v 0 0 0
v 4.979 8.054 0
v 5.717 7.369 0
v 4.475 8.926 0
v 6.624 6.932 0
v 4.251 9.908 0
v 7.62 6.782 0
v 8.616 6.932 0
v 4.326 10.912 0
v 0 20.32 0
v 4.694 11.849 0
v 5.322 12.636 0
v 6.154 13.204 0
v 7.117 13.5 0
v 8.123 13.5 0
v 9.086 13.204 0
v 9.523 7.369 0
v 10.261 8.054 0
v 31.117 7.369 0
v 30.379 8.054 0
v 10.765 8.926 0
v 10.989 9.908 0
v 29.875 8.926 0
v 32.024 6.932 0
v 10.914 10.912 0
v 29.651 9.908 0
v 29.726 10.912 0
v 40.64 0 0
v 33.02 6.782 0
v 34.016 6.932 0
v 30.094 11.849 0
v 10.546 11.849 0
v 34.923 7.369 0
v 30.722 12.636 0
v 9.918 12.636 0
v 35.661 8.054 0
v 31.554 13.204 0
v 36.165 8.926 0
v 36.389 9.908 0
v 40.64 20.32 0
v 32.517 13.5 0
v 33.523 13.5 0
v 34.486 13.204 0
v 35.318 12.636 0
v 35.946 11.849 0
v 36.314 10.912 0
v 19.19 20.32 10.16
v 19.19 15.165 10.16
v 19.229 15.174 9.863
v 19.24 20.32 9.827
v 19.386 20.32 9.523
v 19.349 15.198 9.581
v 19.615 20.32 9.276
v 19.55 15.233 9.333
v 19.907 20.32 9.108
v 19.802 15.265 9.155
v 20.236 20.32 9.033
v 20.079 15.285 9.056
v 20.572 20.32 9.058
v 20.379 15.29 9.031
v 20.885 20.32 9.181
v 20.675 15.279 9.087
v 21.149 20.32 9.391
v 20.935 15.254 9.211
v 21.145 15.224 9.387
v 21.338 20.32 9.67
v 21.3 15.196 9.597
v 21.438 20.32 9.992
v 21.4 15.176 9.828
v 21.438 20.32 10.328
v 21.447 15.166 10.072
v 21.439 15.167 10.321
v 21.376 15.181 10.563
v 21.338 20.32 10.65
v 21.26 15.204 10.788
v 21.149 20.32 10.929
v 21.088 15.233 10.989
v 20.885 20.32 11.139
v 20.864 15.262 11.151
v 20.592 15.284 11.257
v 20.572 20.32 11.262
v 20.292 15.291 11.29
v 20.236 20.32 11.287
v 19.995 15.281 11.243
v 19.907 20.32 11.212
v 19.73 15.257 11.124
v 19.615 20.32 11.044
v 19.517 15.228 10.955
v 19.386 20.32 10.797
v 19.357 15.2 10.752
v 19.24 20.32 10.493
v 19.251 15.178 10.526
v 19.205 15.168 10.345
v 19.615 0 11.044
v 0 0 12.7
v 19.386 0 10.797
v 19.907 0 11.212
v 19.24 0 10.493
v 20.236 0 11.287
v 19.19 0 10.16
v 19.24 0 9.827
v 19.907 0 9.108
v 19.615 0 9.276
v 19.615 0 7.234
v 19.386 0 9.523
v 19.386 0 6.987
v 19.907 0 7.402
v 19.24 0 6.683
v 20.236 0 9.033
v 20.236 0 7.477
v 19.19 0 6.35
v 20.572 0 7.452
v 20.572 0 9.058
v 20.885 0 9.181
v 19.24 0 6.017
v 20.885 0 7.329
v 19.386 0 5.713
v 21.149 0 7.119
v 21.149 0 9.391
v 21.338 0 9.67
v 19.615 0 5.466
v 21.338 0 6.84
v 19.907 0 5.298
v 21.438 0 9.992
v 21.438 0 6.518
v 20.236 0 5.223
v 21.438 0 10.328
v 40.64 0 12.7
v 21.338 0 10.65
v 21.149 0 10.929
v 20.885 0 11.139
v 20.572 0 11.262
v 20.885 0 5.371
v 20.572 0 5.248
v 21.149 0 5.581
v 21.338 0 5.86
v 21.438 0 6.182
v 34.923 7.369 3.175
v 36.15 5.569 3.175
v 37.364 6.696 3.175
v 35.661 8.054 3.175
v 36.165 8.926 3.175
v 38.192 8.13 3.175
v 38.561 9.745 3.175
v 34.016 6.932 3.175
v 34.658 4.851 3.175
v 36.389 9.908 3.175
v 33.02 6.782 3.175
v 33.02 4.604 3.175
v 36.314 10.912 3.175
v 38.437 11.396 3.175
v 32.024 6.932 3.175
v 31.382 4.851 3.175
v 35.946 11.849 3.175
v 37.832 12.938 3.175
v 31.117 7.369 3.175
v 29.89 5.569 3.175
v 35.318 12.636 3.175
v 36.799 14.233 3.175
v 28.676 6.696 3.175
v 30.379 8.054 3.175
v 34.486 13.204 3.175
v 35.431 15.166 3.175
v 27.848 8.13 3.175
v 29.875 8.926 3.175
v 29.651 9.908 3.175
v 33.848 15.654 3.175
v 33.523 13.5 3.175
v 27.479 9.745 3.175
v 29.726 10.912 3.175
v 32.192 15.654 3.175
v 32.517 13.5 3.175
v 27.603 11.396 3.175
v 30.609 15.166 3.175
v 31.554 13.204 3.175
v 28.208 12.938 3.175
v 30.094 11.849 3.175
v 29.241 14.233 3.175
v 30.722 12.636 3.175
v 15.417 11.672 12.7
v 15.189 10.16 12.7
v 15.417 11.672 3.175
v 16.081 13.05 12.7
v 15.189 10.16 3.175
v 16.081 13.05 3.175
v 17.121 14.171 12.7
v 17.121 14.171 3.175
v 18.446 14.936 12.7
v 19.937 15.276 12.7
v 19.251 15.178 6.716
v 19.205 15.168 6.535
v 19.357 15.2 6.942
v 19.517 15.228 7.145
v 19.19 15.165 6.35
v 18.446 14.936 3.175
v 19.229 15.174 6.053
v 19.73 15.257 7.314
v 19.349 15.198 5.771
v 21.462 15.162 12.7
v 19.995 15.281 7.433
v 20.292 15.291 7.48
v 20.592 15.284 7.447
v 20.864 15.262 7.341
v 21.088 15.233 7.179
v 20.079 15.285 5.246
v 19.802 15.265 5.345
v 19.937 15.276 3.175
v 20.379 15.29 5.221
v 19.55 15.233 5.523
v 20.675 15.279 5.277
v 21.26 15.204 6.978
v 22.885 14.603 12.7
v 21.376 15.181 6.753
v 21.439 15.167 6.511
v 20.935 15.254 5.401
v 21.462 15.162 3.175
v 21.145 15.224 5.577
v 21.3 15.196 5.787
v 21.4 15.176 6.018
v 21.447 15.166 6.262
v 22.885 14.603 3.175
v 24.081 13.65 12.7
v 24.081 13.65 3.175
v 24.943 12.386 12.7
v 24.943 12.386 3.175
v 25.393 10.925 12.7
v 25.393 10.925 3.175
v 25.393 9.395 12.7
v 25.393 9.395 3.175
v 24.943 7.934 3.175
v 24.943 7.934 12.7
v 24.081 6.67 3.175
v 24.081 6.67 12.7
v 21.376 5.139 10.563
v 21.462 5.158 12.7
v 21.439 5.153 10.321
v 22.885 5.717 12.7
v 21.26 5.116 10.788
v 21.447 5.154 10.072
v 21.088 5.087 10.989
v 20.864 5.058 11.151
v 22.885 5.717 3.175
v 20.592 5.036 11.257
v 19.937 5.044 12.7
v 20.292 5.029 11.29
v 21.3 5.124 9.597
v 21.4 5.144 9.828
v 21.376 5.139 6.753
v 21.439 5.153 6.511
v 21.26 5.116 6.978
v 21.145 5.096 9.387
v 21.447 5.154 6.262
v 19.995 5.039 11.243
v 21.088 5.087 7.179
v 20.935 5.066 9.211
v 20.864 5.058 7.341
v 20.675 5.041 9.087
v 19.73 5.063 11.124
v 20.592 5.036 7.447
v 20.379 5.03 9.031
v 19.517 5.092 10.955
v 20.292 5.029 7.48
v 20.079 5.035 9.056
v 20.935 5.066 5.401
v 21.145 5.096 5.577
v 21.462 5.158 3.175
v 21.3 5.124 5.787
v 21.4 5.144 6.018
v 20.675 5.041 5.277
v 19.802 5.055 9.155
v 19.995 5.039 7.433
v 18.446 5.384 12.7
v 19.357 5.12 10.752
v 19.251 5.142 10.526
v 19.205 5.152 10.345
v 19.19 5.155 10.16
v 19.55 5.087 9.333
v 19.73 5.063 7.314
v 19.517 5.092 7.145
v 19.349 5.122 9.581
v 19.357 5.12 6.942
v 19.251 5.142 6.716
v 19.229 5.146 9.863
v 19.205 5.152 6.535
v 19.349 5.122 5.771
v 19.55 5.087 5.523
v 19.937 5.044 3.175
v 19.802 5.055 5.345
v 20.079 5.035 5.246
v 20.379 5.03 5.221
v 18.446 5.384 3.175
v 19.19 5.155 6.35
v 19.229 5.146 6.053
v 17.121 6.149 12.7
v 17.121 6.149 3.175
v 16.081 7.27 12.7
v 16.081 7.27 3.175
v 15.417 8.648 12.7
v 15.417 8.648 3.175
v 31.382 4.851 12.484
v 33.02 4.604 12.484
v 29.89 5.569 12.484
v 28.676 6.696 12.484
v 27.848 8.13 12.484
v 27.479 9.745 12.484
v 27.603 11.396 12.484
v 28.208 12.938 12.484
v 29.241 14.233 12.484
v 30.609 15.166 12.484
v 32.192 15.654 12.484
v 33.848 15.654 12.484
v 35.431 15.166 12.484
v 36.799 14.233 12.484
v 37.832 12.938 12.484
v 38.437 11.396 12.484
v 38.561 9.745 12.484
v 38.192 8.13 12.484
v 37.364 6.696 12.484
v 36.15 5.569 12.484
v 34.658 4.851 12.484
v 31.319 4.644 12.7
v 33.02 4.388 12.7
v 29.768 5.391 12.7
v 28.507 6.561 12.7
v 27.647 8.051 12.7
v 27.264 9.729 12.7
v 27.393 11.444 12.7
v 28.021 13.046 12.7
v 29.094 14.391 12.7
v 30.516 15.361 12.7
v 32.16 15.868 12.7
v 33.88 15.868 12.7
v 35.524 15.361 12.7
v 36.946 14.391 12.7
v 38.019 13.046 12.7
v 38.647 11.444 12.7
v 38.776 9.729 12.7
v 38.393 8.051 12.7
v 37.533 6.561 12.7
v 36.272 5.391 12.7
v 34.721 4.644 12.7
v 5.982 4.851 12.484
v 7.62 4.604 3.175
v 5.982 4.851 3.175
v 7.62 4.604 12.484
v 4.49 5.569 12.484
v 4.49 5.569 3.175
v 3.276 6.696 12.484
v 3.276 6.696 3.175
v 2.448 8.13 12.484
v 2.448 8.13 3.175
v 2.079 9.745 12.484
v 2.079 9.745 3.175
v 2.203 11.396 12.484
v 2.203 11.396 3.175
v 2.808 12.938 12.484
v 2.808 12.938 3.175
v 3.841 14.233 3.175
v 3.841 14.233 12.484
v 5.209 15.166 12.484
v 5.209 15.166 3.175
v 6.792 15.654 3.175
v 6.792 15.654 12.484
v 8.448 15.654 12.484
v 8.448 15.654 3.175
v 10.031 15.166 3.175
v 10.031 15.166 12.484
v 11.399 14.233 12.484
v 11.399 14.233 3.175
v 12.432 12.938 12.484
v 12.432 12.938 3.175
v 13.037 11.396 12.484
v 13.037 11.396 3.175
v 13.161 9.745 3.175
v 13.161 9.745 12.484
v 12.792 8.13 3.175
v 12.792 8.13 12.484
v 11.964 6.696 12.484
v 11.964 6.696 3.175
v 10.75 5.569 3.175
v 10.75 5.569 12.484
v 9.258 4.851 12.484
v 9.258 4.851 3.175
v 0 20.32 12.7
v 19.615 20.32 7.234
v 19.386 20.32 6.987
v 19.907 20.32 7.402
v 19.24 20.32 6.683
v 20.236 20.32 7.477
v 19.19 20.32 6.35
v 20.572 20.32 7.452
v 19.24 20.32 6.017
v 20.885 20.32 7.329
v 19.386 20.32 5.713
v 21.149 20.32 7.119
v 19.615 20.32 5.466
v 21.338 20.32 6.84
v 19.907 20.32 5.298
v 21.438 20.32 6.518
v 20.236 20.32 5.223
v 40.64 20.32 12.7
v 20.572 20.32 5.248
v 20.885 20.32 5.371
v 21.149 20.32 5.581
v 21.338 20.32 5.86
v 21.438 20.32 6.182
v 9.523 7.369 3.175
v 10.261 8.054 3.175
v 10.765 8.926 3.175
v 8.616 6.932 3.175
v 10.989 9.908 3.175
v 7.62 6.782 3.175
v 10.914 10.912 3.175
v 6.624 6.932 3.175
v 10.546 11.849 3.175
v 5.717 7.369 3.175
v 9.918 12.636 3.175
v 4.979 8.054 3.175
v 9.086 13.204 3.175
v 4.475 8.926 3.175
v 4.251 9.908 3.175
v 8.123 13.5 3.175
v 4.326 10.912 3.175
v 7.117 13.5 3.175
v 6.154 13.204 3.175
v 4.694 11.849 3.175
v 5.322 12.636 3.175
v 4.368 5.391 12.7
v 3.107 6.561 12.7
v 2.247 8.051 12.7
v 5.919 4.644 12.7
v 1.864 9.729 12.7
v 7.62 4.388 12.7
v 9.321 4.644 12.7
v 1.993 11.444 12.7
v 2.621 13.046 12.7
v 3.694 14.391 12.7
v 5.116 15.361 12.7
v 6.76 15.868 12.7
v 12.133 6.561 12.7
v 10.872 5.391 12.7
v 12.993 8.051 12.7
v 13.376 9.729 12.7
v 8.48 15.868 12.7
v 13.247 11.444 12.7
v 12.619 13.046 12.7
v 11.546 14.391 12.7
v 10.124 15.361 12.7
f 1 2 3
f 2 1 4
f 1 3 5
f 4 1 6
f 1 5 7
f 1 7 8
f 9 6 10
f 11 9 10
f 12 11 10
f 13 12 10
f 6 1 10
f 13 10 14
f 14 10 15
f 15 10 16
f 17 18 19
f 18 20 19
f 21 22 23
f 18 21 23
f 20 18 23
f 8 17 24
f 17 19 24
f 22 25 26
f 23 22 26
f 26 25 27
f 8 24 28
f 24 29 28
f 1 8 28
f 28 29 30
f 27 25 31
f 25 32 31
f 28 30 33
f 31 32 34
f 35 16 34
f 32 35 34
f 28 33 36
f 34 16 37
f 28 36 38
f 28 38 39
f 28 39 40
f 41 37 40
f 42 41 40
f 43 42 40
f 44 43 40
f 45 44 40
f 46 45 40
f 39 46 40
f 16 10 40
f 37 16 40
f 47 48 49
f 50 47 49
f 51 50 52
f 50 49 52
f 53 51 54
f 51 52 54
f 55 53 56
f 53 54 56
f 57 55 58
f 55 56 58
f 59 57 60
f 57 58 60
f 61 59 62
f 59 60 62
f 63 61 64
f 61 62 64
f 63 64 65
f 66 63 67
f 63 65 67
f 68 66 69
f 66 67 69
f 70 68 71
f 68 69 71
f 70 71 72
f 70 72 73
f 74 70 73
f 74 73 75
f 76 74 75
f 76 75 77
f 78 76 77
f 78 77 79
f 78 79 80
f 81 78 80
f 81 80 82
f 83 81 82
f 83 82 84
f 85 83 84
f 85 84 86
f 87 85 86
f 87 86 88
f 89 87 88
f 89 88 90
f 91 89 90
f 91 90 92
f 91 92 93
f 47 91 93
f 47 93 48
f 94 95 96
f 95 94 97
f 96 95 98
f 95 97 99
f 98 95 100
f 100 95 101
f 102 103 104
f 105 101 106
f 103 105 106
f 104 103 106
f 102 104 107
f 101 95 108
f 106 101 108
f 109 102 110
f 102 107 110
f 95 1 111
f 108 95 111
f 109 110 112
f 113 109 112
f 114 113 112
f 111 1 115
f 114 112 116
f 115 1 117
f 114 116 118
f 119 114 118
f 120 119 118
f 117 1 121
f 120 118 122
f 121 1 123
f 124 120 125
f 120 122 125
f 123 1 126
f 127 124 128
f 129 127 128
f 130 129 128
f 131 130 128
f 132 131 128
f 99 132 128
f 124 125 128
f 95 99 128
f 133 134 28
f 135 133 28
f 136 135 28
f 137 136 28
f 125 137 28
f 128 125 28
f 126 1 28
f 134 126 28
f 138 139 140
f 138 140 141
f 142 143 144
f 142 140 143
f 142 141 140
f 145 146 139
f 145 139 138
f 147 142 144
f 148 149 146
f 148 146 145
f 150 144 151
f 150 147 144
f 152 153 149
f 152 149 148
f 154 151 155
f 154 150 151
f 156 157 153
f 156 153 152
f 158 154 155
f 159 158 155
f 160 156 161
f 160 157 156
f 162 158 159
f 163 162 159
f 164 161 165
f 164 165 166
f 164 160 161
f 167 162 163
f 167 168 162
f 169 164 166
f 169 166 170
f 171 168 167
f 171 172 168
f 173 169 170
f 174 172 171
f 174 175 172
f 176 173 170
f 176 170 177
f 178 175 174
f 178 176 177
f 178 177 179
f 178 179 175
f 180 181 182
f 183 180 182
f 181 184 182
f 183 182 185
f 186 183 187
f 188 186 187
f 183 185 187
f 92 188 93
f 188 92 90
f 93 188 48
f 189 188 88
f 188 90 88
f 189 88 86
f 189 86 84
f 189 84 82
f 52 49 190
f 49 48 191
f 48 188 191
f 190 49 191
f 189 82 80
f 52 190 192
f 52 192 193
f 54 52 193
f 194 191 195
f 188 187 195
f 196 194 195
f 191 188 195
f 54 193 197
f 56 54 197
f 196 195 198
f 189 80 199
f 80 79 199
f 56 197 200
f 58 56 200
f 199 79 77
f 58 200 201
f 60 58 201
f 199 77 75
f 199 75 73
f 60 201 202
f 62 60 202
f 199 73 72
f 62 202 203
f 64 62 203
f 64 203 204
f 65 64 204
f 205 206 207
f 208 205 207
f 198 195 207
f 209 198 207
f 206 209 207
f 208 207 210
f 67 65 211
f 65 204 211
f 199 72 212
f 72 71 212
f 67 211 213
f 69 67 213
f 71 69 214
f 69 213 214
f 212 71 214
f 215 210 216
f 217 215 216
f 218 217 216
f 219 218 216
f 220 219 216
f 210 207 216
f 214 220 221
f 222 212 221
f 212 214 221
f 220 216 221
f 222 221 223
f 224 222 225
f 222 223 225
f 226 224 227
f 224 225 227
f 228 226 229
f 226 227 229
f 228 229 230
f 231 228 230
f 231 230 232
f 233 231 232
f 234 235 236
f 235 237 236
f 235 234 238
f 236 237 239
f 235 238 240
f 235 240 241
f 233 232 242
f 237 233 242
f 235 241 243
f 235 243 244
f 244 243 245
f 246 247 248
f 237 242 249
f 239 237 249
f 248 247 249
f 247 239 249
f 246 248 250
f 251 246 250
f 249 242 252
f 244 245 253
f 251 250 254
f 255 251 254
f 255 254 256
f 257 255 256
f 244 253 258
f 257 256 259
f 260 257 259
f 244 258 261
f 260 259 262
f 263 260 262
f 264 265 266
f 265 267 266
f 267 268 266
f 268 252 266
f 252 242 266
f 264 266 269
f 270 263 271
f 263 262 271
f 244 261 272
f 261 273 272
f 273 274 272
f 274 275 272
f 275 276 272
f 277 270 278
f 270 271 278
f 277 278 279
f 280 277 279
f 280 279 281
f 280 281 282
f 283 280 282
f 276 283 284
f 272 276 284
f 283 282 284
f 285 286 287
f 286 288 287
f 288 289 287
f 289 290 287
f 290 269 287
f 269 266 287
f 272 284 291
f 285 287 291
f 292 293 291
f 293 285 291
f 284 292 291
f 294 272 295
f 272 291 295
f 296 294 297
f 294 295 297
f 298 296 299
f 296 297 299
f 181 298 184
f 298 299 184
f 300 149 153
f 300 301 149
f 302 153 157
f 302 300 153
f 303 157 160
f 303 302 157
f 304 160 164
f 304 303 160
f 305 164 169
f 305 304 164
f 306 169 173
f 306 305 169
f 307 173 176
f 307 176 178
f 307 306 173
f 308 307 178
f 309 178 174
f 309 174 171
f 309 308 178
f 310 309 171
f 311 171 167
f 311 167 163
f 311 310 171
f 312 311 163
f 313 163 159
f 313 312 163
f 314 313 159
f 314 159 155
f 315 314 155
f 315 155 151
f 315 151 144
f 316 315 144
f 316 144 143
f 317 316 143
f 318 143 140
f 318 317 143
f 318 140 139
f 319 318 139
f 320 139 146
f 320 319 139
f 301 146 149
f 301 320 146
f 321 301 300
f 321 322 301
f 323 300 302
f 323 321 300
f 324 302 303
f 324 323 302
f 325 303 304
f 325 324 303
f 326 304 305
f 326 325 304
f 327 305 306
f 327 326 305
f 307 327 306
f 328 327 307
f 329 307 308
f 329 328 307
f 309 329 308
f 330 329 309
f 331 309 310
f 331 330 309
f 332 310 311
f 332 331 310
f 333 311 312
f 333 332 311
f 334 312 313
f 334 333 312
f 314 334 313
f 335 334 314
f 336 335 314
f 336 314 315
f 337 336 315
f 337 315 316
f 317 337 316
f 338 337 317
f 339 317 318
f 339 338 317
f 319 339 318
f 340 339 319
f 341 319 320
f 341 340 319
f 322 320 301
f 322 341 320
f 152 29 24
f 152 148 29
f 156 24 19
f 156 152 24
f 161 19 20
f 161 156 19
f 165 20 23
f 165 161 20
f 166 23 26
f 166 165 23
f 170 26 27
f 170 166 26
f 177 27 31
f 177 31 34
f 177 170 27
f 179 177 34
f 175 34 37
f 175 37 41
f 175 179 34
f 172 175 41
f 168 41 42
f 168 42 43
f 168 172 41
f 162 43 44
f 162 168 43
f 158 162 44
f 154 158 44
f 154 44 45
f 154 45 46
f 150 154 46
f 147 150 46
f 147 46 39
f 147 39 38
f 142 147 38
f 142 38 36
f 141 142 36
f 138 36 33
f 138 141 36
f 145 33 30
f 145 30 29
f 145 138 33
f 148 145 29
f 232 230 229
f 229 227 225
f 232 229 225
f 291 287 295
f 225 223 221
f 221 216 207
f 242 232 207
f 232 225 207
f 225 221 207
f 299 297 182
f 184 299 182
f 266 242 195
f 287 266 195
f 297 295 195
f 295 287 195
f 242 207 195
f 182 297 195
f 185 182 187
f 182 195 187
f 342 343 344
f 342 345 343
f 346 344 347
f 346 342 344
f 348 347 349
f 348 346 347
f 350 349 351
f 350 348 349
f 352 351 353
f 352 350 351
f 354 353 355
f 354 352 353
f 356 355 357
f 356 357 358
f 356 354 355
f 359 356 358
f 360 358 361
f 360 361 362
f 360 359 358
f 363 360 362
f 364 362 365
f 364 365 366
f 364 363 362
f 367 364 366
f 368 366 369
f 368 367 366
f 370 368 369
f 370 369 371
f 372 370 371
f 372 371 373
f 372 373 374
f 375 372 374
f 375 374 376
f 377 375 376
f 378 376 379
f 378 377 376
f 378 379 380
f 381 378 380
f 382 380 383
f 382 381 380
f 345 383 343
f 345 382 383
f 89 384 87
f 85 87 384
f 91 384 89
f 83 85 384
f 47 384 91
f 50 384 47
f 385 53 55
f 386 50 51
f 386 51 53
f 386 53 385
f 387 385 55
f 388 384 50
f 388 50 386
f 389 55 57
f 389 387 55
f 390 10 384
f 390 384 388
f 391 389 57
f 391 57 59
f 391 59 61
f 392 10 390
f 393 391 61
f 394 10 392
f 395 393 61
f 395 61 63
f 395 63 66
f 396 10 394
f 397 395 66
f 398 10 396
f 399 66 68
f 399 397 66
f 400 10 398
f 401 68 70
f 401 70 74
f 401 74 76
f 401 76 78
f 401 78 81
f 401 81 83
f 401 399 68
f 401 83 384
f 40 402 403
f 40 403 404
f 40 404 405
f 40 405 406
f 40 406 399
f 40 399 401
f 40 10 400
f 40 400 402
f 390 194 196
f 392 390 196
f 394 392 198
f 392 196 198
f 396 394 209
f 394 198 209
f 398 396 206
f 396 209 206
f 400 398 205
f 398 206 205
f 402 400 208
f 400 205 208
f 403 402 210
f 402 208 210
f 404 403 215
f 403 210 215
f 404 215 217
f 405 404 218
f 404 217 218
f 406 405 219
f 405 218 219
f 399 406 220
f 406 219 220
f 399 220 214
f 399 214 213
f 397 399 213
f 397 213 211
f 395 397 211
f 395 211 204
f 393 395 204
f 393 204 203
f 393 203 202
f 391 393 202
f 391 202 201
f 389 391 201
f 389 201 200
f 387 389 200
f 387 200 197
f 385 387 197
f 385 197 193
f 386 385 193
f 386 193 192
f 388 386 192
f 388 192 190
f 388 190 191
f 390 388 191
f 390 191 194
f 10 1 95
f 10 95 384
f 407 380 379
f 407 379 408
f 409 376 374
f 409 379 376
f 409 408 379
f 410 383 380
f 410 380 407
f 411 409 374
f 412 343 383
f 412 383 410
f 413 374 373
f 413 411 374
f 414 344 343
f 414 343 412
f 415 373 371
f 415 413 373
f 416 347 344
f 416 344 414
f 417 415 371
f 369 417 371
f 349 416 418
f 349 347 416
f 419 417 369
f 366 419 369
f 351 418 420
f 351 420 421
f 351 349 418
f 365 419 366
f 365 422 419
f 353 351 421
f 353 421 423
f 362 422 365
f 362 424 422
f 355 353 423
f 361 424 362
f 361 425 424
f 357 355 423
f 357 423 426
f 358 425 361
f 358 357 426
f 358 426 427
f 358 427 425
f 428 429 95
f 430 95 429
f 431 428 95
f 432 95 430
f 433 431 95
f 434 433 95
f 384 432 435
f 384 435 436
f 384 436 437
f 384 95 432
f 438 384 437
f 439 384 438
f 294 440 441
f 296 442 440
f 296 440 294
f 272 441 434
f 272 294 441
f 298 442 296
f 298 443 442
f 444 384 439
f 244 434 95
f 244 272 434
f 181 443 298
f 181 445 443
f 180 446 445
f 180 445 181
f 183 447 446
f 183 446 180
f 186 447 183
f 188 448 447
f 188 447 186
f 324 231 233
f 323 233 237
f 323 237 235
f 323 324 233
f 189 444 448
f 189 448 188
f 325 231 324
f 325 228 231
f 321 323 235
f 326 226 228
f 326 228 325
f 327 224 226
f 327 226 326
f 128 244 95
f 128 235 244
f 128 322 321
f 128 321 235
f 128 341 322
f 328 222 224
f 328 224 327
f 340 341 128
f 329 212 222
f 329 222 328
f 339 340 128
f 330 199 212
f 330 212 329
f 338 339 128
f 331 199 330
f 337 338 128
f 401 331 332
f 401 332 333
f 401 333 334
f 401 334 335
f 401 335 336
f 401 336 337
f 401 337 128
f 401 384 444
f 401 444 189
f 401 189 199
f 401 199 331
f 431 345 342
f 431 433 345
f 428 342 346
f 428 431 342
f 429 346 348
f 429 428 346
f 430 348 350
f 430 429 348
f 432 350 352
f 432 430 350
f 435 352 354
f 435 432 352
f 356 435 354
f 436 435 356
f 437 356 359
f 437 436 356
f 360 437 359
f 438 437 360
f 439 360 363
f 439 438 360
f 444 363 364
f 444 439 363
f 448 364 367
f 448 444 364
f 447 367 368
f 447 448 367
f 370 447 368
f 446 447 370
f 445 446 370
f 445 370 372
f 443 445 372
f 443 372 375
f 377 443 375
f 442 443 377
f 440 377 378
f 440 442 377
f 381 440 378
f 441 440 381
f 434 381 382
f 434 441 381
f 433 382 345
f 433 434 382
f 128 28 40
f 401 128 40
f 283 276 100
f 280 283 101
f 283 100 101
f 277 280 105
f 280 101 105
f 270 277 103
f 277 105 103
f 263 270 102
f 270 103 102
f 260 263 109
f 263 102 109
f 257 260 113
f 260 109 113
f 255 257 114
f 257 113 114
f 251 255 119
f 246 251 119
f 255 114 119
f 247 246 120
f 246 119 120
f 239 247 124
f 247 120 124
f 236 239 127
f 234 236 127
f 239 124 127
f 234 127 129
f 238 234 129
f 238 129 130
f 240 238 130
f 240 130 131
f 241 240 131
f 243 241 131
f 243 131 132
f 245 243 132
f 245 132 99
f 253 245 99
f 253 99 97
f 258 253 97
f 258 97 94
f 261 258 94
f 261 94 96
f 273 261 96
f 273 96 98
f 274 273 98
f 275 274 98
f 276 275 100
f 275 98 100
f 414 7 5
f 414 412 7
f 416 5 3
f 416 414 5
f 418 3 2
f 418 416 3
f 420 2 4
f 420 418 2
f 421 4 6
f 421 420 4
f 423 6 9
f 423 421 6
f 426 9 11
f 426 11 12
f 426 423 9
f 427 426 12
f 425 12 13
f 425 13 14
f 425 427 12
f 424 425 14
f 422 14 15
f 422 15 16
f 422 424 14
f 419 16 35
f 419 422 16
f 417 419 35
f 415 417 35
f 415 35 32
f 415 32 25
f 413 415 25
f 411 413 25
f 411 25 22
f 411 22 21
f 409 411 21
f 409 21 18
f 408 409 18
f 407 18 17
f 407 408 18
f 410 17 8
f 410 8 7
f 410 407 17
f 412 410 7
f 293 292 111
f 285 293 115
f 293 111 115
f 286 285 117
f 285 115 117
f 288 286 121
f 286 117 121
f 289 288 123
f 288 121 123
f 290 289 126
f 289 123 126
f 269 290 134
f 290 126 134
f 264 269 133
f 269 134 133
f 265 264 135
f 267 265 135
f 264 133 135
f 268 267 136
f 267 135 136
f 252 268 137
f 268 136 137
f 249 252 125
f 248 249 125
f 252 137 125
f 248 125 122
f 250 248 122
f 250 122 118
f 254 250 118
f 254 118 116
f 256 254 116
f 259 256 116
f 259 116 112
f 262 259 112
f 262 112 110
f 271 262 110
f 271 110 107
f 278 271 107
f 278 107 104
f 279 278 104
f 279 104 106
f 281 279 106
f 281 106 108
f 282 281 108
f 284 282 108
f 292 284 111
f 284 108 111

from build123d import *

# Parameters (mm, degrees)
SKETCH1_W                                     = 40.64
SKETCH1_H                                     = 20.32
BOSS_EXTRUDE2_DEPTH                           = 12.7
CBORE_FOR_1_4_SOCKET_HEAD_CAP_SCREW1_AT_COUNT = 2
CBORE_FOR_1_4_SOCKET_HEAD_CAP_SCREW1_AT_PITCH = 25.4
HOLE1_D                                       = 10.2616
HOLE1_DEPTH                                   = 9.525
F_4_40_TAPPED_HOLE1_D                         = 2.2606


with BuildPart() as part:
    # Sketch1 → Boss-Extrude2 (new body)
    with BuildSketch(Plane.XY):
        with Locations((20.32, 10.16)):
            Rectangle(SKETCH1_W, SKETCH1_H)
    extrude(amount=BOSS_EXTRUDE2_DEPTH)

    # Sketch3 → CBORE for 1/4 Socket Head Cap Screw1 (revolve, cut)
    with BuildSketch(Plane(origin=(7.62, 10.16, 12.7), x_dir=(0, -1, 0), z_dir=(1, 0, 0))):
        Polygon((0, 0), (0, 12.7), (3.3782, 12.7), (3.3782, 9.525), (5.55625, 9.525), (5.55625, 0.2159), (5.77215, 0), align=None)
    cbore_for_1_4_socket_head_cap_screw1 = revolve(axis=Axis((7.62, 10.16, 19.05), (0, 0, -1)), mode=Mode.SUBTRACT)

    # CBORE for 1/4 Socket Head Cap Screw1 at: CBORE for 1/4 Socket Head Cap Screw1 ×2
    with Locations(*[(i * CBORE_FOR_1_4_SOCKET_HEAD_CAP_SCREW1_AT_PITCH, 0, 0) for i in range(1, CBORE_FOR_1_4_SOCKET_HEAD_CAP_SCREW1_AT_COUNT)]):
        add(cbore_for_1_4_socket_head_cap_screw1, mode=Mode.SUBTRACT)

    # Hole1
    with Locations(Plane.XY.offset(12.7)):
        with Locations((20.32, 10.16)):
            Hole(HOLE1_D / 2, depth=HOLE1_DEPTH)

    # #4-40 Tapped Hole1 (through all)
    with Locations(Plane(origin=(0, 20.32, 0), x_dir=(1, 0, 0), z_dir=(0, 1, 0))):
        with Locations((20.32, -10.16), (20.32, -6.35)):
            Hole(F_4_40_TAPPED_HOLE1_D / 2)


solid = part.part
